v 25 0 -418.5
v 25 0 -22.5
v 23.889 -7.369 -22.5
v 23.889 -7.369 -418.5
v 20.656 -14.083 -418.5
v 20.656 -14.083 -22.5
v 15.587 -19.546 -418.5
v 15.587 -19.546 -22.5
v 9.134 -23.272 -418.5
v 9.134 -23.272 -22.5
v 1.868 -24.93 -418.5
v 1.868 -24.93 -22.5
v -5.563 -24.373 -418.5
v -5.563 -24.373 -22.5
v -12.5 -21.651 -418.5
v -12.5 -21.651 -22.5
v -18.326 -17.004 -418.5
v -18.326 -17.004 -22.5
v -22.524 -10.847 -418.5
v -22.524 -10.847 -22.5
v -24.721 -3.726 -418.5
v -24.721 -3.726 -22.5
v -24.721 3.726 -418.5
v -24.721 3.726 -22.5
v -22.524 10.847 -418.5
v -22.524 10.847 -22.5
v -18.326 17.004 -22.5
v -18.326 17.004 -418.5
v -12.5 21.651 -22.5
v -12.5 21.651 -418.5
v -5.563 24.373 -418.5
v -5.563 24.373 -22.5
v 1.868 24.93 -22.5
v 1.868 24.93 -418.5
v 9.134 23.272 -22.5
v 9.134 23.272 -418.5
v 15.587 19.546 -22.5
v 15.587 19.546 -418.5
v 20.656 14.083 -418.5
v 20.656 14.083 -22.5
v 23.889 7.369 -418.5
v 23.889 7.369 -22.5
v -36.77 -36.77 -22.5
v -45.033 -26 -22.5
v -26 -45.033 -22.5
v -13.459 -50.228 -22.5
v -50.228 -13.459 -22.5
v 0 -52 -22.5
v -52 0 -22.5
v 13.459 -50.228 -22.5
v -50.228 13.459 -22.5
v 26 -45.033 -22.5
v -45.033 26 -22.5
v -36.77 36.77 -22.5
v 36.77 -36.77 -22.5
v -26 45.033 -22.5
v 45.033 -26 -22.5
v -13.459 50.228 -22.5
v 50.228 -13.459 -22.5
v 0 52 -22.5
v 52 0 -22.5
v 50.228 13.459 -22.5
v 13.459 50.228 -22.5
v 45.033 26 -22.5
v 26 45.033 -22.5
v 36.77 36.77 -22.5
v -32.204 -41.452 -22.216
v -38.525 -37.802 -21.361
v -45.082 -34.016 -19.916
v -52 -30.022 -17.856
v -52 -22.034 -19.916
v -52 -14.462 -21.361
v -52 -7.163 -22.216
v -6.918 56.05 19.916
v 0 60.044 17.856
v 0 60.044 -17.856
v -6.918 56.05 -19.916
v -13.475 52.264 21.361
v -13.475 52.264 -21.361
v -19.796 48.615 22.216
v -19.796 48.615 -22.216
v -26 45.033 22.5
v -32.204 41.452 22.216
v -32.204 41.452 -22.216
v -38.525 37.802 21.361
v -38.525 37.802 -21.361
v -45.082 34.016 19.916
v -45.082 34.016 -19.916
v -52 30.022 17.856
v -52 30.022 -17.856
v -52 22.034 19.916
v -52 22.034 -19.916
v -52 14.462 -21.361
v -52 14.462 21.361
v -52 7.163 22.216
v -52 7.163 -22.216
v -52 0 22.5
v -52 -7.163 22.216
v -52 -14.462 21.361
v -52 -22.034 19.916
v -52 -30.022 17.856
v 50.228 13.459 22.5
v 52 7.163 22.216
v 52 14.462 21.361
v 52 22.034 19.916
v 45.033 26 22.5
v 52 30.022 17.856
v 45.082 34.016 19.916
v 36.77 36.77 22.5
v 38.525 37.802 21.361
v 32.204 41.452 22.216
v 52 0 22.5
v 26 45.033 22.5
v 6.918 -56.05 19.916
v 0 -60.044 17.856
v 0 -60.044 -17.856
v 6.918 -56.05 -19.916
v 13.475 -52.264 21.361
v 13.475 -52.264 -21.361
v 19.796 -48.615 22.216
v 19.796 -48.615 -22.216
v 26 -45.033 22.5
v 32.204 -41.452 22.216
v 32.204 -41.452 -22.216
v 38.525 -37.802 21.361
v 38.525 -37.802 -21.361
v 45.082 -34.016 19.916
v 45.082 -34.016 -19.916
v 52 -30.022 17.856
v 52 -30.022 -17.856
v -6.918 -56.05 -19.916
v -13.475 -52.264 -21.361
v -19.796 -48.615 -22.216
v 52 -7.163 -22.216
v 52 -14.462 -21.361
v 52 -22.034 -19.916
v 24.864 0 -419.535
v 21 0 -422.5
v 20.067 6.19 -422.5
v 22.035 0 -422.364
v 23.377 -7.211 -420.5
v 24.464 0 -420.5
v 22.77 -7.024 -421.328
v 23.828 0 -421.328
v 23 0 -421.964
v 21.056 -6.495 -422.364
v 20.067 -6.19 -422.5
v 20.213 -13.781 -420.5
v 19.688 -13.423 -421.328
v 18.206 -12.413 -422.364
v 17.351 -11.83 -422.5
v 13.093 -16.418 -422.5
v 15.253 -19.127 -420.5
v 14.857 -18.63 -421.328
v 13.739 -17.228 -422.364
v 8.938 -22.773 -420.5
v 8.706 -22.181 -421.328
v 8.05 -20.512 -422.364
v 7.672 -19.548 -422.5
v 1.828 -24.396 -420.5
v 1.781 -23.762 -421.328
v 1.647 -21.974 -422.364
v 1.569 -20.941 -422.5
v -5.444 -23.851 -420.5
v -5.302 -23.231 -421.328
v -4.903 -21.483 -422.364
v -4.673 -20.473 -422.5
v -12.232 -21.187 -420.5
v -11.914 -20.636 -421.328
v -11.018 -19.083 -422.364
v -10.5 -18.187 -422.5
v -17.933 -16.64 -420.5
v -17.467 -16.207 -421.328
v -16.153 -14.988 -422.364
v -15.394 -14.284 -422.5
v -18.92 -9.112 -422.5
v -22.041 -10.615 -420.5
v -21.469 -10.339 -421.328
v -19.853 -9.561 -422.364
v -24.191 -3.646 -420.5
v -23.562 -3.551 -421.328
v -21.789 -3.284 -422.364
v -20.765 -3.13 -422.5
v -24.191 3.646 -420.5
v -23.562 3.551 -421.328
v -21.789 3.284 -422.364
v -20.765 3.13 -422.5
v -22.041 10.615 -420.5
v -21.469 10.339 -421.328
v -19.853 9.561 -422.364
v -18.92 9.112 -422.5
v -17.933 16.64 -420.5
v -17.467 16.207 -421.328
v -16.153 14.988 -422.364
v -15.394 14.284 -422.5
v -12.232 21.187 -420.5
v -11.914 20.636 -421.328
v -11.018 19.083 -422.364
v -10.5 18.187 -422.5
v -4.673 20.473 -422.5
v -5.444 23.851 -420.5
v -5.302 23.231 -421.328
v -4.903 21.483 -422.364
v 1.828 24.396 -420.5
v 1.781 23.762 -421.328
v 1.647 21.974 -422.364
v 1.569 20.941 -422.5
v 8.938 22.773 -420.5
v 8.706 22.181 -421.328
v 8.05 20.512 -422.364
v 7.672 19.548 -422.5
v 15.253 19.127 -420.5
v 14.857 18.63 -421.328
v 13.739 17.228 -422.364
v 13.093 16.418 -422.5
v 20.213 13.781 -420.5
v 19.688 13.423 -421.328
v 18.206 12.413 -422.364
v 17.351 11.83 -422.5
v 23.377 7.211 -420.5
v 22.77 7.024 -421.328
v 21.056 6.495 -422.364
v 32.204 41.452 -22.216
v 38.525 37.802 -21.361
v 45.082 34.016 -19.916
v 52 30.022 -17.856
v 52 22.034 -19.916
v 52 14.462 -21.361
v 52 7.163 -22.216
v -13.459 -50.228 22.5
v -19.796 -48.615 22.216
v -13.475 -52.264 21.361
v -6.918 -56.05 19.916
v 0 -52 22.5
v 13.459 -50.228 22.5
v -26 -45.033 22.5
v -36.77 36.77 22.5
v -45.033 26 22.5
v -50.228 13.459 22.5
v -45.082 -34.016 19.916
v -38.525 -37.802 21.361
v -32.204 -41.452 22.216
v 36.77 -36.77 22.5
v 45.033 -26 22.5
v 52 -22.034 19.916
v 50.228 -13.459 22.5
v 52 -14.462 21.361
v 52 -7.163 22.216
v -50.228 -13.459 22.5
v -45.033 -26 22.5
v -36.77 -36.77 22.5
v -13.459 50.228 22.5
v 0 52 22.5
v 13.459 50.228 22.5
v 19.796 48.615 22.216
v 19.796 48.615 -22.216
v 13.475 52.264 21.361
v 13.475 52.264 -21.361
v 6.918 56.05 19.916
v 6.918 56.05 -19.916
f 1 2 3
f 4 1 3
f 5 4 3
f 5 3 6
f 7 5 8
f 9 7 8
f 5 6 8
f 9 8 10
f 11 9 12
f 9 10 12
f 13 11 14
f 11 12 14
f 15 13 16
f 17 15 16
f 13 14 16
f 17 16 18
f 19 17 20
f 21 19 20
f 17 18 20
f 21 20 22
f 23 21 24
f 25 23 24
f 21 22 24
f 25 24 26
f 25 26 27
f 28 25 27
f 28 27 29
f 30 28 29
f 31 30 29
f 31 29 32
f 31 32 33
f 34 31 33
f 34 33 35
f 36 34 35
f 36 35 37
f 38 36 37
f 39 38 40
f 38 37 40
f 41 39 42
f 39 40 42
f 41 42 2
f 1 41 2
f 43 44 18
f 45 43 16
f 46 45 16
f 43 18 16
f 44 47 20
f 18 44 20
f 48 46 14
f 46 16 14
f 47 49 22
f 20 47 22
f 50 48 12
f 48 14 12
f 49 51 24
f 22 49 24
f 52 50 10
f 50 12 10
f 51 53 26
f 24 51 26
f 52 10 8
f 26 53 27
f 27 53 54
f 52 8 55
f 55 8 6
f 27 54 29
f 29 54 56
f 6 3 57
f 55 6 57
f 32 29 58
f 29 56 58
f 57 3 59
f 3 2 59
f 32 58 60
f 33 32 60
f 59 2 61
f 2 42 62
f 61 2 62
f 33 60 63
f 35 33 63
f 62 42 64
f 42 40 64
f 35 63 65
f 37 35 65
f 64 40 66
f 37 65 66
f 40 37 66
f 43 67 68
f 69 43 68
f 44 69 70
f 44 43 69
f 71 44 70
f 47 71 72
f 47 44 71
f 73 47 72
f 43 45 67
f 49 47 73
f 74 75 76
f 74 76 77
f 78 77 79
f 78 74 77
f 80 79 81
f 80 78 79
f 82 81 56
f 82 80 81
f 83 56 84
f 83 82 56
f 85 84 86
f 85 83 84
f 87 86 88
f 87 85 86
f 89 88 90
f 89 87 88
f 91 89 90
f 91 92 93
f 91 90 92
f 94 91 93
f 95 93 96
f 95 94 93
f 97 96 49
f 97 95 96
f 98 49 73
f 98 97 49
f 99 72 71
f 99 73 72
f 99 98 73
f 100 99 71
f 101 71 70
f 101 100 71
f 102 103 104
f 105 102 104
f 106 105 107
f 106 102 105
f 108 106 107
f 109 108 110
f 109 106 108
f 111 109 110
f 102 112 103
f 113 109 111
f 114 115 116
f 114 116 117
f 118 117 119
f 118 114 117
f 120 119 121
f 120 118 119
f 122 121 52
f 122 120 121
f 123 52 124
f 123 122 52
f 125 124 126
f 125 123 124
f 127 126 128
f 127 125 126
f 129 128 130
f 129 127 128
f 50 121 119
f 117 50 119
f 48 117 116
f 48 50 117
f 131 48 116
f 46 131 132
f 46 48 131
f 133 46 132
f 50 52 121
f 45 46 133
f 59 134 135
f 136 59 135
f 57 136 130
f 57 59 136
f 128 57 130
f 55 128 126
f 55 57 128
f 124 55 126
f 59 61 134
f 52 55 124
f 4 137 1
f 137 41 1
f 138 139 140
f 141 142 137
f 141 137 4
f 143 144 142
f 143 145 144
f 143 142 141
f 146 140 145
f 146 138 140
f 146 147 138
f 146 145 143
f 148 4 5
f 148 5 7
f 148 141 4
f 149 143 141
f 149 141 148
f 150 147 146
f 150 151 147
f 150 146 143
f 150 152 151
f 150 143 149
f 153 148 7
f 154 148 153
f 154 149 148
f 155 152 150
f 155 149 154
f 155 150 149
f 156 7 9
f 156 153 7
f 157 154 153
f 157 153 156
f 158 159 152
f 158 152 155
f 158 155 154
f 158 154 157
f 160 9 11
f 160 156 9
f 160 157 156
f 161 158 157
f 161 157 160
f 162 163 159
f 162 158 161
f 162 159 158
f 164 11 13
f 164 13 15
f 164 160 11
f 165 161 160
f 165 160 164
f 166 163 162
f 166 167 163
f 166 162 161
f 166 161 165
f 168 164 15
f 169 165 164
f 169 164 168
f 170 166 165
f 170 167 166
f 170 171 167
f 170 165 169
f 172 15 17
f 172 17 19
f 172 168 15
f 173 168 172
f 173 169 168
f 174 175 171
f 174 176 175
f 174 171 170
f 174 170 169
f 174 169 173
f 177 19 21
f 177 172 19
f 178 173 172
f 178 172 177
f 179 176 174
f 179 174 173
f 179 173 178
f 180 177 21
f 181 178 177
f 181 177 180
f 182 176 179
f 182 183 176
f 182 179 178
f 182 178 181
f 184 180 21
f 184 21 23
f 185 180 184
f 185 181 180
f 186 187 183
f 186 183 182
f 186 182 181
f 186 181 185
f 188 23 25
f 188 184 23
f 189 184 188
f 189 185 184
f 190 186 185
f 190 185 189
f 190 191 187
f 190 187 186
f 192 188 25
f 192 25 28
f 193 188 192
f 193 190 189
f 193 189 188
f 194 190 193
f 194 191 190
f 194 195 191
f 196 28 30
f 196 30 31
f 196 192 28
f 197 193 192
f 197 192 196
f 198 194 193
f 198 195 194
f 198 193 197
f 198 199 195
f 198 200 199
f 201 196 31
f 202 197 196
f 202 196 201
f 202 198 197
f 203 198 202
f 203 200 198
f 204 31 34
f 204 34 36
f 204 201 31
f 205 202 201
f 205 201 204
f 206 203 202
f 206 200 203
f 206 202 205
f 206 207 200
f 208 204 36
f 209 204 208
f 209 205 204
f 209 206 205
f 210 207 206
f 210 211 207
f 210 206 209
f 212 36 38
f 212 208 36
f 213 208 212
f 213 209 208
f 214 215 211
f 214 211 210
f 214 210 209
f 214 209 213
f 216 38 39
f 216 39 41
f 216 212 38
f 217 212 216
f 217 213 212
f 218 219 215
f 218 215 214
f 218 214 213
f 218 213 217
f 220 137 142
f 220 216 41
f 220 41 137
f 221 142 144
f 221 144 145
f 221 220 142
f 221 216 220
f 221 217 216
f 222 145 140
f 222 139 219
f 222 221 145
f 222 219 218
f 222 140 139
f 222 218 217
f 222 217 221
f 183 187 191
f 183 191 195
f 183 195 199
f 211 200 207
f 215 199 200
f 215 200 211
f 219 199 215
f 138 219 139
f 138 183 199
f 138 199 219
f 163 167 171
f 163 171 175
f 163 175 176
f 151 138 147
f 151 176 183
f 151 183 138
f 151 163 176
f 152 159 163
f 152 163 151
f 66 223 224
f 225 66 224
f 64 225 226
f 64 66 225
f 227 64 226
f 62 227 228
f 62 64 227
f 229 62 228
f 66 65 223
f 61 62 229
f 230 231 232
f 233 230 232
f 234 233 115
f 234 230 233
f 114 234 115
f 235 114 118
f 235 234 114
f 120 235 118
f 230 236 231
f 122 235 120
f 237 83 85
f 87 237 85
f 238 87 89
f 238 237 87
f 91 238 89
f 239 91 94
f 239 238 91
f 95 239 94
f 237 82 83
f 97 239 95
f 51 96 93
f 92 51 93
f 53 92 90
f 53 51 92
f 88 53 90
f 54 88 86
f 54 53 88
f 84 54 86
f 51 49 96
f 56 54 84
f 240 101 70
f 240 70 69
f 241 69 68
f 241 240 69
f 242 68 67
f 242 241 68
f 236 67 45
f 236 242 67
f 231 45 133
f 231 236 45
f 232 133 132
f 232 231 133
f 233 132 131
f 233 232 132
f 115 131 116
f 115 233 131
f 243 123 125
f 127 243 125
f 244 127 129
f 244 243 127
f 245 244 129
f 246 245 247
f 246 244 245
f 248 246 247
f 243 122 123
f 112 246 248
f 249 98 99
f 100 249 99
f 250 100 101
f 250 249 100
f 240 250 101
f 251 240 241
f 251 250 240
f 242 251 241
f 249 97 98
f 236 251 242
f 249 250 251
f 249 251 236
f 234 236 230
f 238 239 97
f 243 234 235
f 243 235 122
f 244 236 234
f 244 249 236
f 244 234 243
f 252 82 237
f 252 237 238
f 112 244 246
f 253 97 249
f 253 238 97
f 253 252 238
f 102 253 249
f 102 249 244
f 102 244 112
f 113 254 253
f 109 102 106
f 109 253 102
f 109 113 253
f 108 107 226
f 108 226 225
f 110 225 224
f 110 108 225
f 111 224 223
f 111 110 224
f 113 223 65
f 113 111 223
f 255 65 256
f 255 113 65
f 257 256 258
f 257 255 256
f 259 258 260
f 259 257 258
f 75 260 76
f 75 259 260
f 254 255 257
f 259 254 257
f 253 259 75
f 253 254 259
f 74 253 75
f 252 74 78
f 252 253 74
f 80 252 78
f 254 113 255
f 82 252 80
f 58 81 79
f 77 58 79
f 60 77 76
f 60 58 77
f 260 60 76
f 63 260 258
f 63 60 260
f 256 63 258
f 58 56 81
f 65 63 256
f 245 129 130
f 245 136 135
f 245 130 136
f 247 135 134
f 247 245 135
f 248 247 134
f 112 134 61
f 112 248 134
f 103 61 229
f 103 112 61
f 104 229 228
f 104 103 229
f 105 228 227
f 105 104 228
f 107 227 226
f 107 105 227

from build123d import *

# Parameters (mm, degrees)
BOSS_EXTRUDE1_DEPTH = 22.5
SKETCH2_OUTSIDE_W   = 294.908
SKETCH2_OUTSIDE_H   = 310.996
SKETCH2_OUTSIDE_R   = 52
CUT_EXTRUDE1_DEPTH  = 45
CUT_EXTRUDE1_DRAFT  = -60
SKETCH3_OUTSIDE_W   = 294.908
SKETCH3_OUTSIDE_H   = 310.996
SKETCH3_OUTSIDE_R   = 52
CUT_EXTRUDE2_DEPTH  = 45
CUT_EXTRUDE2_DRAFT  = -60
SKETCH4_R           = 25
BOSS_EXTRUDE2_DEPTH = 400
FILLET1_R           = 4


with BuildPart() as part:
    # Sketch1 → Boss-Extrude1 (new, symmetric)
    with BuildSketch(Plane.XY):
        Polygon((52, 30.022213998), (0, 60.044427996), (-52, 30.022213998), (-52, -30.022213998), (0, -60.044427996), (52, -30.022213998), align=None)
    extrude(amount=BOSS_EXTRUDE1_DEPTH, both=True)


with BuildPart() as cut_extrude1_tool:
    # Sketch2 outside → Cut-Extrude1 (with draft: the straight prism first)
    with BuildSketch(Plane.XY.offset(22.5)):
        Rectangle(SKETCH2_OUTSIDE_W, SKETCH2_OUTSIDE_H)
        Circle(SKETCH2_OUTSIDE_R, mode=Mode.SUBTRACT)
    extrude(amount=-CUT_EXTRUDE1_DEPTH)
    # Cut-Extrude1: the draft: its side faces are tilted about the plane it starts from
    cut_extrude1_sides = [cut_extrude1_tool.faces().sort_by_distance(p)[0] for p in [
        (0, -155.498, 0),
        (147.454, 0, 0),
        (0, 155.498, 0),
        (-147.454, 0, 0),
        (-52, 0, 0),
    ]]
    draft(cut_extrude1_sides, Plane.XY.offset(22.5), CUT_EXTRUDE1_DRAFT)


with BuildPart() as part_1:
    add(part.part)

    # Cut-Extrude1: cut by cut_extrude1_tool
    add(cut_extrude1_tool.part, mode=Mode.SUBTRACT)


with BuildPart() as cut_extrude2_tool:
    # Sketch3 outside → Cut-Extrude2 (with draft: the straight prism first)
    with BuildSketch(Plane(origin=(0, 0, -22.5), x_dir=(-1, 0, 0), z_dir=(0, 0, -1))):
        Rectangle(SKETCH3_OUTSIDE_W, SKETCH3_OUTSIDE_H)
        Circle(SKETCH3_OUTSIDE_R, mode=Mode.SUBTRACT)
    extrude(amount=-CUT_EXTRUDE2_DEPTH)
    # Cut-Extrude2: the draft: its side faces are tilted about the plane it starts from
    cut_extrude2_sides = [cut_extrude2_tool.faces().sort_by_distance(p)[0] for p in [
        (0, -155.498, 0),
        (-147.454, 0, 0),
        (0, 155.498, 0),
        (147.454, 0, 0),
        (52, 0, 0),
    ]]
    draft(cut_extrude2_sides, Plane(origin=(0, 0, -22.5), x_dir=(-1, 0, 0), z_dir=(0, 0, -1)), CUT_EXTRUDE2_DRAFT)


with BuildPart() as part_2:
    add(part_1.part)

    # Cut-Extrude2: cut by cut_extrude2_tool
    add(cut_extrude2_tool.part, mode=Mode.SUBTRACT)

    # Sketch4 → Boss-Extrude2 (add)
    with BuildSketch(Plane(origin=(0, 0, -22.5), x_dir=(-1, 0, 0), z_dir=(0, 0, -1))):
        with Locations(Location((0, 0, 0), (0, 0, 180))):
            Circle(SKETCH4_R)
    extrude(amount=BOSS_EXTRUDE2_DEPTH)

    # Fillet1
    fillet1_edges = [part_2.edges().sort_by_distance(p)[0] for p in [
        (-25, 0, -422.5),
    ]]
    fillet(fillet1_edges, radius=FILLET1_R)


solid = part_2.part
